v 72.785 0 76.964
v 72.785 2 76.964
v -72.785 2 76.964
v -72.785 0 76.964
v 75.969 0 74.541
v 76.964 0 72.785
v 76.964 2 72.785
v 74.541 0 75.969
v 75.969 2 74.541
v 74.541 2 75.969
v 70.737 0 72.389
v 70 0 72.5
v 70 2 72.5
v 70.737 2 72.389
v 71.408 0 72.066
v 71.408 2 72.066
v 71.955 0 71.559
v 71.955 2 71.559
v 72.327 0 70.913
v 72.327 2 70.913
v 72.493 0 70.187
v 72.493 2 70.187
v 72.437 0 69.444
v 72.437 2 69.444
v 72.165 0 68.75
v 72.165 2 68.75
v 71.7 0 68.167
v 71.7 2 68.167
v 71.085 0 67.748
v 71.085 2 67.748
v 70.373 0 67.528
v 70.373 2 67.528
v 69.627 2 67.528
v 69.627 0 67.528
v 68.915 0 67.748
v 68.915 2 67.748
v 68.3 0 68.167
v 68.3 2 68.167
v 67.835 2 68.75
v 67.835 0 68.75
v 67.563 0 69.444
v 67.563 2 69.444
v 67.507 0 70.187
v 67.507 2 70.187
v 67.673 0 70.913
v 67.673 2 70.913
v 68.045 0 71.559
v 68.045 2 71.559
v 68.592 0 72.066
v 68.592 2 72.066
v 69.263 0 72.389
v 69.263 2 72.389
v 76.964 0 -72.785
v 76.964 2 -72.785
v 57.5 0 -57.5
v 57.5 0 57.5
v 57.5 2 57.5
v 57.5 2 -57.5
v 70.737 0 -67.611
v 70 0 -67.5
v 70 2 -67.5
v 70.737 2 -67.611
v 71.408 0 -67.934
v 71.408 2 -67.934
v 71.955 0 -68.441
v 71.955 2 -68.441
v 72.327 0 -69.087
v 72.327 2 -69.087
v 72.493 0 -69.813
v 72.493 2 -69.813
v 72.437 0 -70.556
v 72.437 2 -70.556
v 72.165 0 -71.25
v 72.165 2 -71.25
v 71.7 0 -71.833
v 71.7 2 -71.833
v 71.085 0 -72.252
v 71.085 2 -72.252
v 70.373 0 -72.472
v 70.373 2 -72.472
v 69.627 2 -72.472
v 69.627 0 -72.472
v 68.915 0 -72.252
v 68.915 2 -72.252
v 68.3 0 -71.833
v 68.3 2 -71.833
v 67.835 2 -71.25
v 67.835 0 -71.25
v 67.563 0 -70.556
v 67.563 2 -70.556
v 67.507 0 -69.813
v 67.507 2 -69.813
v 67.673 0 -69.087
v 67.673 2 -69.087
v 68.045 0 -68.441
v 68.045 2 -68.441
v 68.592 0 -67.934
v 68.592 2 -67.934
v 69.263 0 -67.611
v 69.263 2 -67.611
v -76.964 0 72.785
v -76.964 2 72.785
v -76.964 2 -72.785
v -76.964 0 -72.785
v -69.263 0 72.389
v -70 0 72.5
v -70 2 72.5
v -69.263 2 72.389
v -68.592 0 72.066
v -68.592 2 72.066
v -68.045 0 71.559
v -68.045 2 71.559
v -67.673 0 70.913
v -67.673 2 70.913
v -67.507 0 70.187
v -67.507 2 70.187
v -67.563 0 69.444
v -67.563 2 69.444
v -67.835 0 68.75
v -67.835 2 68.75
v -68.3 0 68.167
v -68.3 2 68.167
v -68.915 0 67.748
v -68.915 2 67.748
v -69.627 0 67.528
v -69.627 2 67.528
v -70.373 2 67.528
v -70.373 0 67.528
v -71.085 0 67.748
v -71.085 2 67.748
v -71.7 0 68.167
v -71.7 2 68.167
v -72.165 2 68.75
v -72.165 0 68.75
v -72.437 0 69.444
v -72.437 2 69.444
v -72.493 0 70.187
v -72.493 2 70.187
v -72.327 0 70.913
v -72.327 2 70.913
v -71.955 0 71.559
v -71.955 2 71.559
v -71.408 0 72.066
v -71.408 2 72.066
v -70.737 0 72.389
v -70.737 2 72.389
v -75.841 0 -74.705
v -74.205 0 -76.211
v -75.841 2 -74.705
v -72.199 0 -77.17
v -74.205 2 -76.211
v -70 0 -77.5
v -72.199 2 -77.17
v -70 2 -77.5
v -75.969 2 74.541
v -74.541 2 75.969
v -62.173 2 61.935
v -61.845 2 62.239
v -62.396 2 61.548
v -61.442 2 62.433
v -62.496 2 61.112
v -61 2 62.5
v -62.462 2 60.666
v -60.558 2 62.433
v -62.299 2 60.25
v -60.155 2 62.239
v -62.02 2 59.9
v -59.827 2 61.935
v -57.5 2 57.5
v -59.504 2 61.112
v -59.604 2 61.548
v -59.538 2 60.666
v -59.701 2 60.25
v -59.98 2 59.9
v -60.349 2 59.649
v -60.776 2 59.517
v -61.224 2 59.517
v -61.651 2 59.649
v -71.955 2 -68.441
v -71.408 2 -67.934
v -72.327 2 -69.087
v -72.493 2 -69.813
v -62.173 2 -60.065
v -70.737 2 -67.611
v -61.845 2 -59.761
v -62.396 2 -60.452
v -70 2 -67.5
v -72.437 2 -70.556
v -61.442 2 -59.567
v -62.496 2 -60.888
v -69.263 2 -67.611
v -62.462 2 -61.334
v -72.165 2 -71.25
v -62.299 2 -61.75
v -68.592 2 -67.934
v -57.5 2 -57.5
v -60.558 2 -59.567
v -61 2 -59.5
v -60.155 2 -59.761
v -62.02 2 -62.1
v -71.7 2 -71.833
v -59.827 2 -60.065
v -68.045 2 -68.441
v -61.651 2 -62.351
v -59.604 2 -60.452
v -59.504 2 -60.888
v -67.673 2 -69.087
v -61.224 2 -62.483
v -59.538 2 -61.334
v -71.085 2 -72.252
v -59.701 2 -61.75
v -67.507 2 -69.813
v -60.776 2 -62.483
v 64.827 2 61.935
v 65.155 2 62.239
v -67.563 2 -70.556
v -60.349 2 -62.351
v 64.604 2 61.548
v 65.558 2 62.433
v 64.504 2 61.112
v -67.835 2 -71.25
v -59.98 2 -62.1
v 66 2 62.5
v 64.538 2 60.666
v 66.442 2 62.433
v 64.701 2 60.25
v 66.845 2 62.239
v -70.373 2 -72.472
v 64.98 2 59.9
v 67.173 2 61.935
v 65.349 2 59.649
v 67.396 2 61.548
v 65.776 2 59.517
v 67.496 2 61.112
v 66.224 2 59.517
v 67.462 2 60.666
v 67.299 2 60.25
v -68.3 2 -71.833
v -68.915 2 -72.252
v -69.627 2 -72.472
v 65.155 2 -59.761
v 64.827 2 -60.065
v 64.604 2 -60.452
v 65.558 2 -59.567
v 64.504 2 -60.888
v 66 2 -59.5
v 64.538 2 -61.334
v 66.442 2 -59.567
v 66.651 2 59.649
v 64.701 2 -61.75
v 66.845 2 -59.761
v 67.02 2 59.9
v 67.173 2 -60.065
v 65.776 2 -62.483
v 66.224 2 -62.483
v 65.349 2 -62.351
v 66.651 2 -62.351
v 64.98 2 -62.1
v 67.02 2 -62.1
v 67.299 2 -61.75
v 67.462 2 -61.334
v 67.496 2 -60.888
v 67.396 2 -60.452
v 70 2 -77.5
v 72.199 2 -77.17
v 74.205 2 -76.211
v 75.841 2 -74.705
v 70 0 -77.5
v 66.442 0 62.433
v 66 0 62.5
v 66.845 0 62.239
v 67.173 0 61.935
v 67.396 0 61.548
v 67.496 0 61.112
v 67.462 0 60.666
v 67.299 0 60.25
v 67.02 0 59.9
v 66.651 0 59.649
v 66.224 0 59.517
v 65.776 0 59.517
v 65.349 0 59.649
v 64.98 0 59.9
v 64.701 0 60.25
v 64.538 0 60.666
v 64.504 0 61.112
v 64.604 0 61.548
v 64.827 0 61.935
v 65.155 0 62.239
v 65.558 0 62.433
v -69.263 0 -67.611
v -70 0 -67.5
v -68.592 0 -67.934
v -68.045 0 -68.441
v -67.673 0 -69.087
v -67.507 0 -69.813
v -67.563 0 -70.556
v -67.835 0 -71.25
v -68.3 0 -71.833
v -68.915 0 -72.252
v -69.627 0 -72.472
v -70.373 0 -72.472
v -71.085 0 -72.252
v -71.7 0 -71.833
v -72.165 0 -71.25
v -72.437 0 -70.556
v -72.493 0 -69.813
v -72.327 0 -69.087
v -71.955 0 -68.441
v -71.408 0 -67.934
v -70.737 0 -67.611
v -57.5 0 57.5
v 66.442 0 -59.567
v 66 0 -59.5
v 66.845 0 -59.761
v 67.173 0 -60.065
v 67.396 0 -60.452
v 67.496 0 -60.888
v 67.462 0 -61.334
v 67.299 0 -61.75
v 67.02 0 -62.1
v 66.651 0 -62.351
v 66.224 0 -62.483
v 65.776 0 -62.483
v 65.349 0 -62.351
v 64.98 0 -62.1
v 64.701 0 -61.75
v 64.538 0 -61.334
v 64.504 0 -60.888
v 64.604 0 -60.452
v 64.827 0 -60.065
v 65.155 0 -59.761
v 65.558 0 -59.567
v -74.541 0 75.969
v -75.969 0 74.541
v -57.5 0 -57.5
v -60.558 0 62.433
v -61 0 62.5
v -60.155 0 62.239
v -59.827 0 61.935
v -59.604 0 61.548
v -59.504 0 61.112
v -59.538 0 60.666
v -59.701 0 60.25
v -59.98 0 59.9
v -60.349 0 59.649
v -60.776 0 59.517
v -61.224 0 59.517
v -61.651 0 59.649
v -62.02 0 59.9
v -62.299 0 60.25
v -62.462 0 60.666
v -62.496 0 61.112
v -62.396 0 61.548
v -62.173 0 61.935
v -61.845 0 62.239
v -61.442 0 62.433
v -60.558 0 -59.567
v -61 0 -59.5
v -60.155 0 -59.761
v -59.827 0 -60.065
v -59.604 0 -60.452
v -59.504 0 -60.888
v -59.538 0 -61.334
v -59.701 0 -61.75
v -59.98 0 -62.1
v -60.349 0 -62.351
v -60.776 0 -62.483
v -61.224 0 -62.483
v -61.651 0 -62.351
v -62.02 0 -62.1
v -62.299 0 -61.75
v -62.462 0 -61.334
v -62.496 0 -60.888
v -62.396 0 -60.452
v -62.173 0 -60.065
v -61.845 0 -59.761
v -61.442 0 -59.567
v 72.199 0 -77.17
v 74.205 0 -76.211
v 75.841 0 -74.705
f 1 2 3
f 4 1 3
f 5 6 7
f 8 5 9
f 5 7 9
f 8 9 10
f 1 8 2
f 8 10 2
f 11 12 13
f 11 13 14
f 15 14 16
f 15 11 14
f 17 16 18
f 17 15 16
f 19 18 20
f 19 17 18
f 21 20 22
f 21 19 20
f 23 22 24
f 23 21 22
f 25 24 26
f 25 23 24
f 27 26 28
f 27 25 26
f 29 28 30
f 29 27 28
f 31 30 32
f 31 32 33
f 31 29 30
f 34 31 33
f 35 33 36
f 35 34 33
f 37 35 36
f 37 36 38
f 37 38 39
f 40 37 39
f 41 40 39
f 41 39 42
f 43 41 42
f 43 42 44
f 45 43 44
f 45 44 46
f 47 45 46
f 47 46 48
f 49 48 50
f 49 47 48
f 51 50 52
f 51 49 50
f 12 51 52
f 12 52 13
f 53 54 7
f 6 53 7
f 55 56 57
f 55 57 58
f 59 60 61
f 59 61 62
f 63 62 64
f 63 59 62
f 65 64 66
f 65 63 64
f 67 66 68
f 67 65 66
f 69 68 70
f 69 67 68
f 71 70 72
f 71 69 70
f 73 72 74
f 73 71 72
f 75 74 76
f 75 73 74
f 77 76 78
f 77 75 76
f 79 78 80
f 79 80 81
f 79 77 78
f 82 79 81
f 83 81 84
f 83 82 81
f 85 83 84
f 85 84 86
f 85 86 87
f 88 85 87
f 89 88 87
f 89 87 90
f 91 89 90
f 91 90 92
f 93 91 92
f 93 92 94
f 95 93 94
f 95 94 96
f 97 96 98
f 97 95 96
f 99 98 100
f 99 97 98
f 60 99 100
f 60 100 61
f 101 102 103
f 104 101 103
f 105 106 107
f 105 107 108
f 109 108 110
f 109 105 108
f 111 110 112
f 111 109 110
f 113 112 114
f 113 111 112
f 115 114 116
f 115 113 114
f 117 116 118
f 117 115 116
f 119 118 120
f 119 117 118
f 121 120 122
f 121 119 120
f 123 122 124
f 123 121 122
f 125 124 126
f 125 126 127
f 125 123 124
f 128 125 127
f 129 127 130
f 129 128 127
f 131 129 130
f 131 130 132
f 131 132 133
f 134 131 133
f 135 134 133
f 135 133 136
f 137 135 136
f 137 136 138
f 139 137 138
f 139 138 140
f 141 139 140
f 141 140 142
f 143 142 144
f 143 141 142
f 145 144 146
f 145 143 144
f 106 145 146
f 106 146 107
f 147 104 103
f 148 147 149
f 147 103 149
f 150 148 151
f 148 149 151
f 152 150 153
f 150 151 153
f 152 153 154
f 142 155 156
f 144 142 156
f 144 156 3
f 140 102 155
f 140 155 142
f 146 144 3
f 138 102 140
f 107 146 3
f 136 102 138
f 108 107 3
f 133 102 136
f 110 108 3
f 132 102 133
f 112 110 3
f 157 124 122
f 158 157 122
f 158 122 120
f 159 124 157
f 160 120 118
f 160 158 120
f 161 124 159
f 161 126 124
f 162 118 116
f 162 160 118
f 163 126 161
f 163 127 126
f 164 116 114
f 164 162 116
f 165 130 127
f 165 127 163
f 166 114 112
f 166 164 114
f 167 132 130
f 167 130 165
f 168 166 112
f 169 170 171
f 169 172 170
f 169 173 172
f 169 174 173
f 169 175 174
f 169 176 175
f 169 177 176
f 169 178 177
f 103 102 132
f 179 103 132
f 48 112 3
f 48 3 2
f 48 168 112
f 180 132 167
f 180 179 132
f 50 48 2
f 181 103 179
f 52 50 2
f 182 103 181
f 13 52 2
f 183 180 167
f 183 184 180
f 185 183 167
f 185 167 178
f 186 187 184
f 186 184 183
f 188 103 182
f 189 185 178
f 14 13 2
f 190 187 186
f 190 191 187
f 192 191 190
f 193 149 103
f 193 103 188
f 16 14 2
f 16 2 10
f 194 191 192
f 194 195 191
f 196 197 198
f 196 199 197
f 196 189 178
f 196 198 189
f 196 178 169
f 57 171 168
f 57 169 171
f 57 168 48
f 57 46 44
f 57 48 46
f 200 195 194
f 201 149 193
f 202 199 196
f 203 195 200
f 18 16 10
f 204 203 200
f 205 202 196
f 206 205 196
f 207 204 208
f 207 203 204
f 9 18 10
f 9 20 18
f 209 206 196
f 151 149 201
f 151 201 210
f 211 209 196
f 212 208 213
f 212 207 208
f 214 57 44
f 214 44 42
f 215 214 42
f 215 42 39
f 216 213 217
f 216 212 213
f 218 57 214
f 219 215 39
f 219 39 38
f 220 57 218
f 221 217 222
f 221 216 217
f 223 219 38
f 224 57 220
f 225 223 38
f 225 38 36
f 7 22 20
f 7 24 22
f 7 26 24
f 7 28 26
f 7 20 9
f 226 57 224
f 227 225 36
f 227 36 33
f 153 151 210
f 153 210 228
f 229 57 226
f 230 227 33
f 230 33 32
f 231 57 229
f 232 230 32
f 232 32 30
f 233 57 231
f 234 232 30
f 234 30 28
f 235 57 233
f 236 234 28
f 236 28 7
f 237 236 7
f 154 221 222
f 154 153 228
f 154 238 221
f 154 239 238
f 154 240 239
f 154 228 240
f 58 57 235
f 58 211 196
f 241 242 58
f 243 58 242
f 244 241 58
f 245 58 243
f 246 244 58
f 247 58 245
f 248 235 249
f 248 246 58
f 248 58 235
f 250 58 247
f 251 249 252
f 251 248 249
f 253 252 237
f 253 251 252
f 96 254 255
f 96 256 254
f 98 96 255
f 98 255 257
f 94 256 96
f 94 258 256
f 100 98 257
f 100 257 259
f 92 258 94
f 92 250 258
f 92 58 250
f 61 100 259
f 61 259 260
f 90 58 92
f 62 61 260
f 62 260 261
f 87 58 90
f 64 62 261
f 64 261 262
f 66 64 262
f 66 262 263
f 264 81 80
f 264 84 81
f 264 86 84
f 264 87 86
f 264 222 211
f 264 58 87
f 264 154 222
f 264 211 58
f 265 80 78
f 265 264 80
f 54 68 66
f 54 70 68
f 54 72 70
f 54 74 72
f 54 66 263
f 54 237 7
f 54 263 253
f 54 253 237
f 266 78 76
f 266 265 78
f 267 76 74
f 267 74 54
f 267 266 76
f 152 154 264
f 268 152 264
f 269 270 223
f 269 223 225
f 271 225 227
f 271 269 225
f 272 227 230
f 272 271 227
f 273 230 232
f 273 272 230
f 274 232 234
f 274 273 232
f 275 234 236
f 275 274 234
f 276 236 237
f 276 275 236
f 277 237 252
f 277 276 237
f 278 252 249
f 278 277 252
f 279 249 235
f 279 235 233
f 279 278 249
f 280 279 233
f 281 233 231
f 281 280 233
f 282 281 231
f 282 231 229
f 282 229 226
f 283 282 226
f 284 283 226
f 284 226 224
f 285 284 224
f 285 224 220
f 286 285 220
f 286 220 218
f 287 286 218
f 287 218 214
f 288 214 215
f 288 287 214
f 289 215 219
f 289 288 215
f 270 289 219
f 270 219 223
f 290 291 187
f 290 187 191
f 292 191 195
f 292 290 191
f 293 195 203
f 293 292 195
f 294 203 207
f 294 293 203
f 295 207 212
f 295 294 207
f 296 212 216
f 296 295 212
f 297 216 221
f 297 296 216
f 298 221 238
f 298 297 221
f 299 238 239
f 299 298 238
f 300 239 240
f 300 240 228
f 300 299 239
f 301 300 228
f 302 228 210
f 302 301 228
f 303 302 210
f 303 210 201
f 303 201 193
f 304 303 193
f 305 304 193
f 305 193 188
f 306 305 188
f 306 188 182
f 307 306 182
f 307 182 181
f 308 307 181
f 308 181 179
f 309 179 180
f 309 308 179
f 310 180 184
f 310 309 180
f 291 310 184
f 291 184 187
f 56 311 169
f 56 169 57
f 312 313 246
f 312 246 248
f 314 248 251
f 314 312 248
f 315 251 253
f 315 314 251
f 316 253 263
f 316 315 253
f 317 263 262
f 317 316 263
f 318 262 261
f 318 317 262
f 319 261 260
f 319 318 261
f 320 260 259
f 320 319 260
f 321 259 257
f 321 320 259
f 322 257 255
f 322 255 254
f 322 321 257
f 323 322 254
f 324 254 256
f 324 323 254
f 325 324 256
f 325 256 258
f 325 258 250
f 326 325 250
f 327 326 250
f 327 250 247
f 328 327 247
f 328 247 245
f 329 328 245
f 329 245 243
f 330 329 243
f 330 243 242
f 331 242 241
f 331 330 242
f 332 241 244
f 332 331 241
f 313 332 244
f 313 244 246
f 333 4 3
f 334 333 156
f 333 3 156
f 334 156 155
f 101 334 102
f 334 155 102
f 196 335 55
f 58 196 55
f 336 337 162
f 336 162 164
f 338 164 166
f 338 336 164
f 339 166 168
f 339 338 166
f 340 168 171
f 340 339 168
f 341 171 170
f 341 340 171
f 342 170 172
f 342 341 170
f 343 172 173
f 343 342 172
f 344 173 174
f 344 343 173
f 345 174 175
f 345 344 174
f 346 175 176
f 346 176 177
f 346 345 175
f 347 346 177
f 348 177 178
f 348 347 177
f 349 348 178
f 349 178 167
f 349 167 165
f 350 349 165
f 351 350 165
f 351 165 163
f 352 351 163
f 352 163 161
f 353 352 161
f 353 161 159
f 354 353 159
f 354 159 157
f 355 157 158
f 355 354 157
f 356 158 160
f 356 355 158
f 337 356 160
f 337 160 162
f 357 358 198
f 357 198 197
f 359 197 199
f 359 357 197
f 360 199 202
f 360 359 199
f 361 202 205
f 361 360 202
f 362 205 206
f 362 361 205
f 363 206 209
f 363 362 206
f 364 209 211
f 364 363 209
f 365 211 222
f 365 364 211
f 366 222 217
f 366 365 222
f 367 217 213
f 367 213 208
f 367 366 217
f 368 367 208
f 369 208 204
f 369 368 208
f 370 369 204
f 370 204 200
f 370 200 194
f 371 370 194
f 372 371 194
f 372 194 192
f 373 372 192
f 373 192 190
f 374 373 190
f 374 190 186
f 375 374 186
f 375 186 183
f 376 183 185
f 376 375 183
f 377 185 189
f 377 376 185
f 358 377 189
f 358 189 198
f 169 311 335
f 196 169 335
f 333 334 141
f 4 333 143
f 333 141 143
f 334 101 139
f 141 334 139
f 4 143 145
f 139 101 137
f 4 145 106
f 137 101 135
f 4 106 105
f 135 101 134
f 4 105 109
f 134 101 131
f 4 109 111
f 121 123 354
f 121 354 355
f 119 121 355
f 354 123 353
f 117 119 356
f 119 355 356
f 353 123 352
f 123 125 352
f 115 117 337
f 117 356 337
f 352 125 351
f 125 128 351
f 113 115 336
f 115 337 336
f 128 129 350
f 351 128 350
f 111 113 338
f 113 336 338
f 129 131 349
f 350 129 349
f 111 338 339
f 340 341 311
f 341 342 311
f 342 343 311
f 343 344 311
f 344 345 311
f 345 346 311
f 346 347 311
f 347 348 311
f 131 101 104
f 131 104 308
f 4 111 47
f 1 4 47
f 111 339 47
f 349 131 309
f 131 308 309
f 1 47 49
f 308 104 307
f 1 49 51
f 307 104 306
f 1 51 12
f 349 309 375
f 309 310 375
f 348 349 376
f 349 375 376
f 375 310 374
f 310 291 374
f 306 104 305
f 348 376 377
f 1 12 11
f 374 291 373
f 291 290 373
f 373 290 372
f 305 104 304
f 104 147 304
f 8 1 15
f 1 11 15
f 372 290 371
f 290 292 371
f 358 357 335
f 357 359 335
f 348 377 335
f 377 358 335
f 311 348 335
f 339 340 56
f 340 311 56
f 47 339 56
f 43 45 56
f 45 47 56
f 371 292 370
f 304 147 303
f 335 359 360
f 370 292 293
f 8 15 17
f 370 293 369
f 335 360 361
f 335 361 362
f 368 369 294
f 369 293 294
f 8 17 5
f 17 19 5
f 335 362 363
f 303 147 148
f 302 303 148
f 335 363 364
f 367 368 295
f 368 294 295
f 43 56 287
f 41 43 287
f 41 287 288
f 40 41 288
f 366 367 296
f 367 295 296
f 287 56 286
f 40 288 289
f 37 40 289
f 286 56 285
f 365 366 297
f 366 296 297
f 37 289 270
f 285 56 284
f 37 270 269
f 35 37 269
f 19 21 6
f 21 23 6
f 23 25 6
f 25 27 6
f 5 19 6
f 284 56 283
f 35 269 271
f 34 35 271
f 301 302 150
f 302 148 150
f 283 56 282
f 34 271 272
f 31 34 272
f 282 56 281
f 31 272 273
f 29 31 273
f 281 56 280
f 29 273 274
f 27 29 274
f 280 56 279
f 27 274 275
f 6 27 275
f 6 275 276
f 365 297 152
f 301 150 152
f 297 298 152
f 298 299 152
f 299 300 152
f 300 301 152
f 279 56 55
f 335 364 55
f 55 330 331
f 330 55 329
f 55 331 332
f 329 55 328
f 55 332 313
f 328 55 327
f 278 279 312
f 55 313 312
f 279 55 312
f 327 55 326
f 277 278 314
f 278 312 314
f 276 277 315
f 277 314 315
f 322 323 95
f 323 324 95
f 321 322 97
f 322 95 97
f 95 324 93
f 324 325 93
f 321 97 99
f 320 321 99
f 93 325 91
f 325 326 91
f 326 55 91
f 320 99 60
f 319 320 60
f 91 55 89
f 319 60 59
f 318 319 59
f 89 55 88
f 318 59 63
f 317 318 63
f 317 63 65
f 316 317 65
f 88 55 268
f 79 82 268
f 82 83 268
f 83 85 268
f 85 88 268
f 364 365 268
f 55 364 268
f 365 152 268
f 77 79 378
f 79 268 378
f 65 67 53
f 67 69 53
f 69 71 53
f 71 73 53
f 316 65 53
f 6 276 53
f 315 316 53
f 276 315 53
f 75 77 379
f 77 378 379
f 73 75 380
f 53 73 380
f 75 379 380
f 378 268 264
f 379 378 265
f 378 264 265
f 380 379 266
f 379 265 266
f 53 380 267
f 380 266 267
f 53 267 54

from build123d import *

# Parameters (mm, degrees)
CROQUIS1_W              = 160
CROQUIS1_H              = 160
CROQUIS1_R              = 2.5
CROQUIS1_R_2            = 1.5
CROQUIS1_W_2            = 115
CROQUIS1_H_2            = 115
SALIENTE_EXTRUIR1_DEPTH = 2
CROQUIS3_W              = 170
CROQUIS3_H              = 170
CORTAR_EXTRUIR1_DEPTH   = 10


with BuildPart() as part:
    # Croquis1 → Saliente-Extruir1 (new body)
    with BuildSketch(Plane(origin=(0, 0, 0), x_dir=(1, 0, 0), z_dir=(0, 1, 0))):
        Rectangle(CROQUIS1_W, CROQUIS1_H)
        with Locations(Location((-70, 70, 0), (0, 0, 270))):
            Circle(CROQUIS1_R, mode=Mode.SUBTRACT)
        with Locations(Location((70, 70, 0), (0, 0, 270))):
            Circle(CROQUIS1_R, mode=Mode.SUBTRACT)
        with Locations(Location((70, -70, 0), (0, 0, 270))):
            Circle(CROQUIS1_R, mode=Mode.SUBTRACT)
        with Locations(Location((-70, -70, 0), (0, 0, 270))):
            Circle(CROQUIS1_R, mode=Mode.SUBTRACT)
        with Locations(Location((-61, 61, 0), (0, 0, 270))):
            Circle(CROQUIS1_R_2, mode=Mode.SUBTRACT)
        with Locations(Location((66, 61, 0), (0, 0, 270))):
            Circle(CROQUIS1_R_2, mode=Mode.SUBTRACT)
        with Locations(Location((66, -61, 0), (0, 0, 270))):
            Circle(CROQUIS1_R_2, mode=Mode.SUBTRACT)
        with Locations(Location((-61, -61, 0), (0, 0, 270))):
            Circle(CROQUIS1_R_2, mode=Mode.SUBTRACT)
        Rectangle(CROQUIS1_W_2, CROQUIS1_H_2, mode=Mode.SUBTRACT)
    extrude(amount=SALIENTE_EXTRUIR1_DEPTH)

    # Croquis3 → Cortar-Extruir1 (cut)
    with BuildSketch(Plane(origin=(0, 2, 0), x_dir=(1, 0, 0), z_dir=(0, 1, 0))):
        Rectangle(CROQUIS3_W, CROQUIS3_H)
        with BuildLine():
            Line((72.785430073, -76.963575182), (-72.785430073, -76.963575182))
            ThreePointArc((-72.785430073, -76.963575182), (-75.303300859, -75.303300859), (-76.963575182, -72.785430073))
            Line((-76.963575182, -72.785430073), (-76.963575182, 72.785430073))
            ThreePointArc((-76.963575182, 72.785430073), (-74.20471607, 76.210504229), (-70, 77.5))
            Line((-70, 77.5), (70, 77.5))
            ThreePointArc((70, 77.5), (74.20471607, 76.210504229), (76.963575182, 72.785430073))
            Line((76.963575182, 72.785430073), (76.963575182, -72.785430073))
            ThreePointArc((76.963575182, -72.785430073), (75.303300859, -75.303300859), (72.785430073, -76.963575182))
        make_face(mode=Mode.SUBTRACT)
    extrude(amount=-CORTAR_EXTRUIR1_DEPTH, mode=Mode.SUBTRACT)


solid = part.part
